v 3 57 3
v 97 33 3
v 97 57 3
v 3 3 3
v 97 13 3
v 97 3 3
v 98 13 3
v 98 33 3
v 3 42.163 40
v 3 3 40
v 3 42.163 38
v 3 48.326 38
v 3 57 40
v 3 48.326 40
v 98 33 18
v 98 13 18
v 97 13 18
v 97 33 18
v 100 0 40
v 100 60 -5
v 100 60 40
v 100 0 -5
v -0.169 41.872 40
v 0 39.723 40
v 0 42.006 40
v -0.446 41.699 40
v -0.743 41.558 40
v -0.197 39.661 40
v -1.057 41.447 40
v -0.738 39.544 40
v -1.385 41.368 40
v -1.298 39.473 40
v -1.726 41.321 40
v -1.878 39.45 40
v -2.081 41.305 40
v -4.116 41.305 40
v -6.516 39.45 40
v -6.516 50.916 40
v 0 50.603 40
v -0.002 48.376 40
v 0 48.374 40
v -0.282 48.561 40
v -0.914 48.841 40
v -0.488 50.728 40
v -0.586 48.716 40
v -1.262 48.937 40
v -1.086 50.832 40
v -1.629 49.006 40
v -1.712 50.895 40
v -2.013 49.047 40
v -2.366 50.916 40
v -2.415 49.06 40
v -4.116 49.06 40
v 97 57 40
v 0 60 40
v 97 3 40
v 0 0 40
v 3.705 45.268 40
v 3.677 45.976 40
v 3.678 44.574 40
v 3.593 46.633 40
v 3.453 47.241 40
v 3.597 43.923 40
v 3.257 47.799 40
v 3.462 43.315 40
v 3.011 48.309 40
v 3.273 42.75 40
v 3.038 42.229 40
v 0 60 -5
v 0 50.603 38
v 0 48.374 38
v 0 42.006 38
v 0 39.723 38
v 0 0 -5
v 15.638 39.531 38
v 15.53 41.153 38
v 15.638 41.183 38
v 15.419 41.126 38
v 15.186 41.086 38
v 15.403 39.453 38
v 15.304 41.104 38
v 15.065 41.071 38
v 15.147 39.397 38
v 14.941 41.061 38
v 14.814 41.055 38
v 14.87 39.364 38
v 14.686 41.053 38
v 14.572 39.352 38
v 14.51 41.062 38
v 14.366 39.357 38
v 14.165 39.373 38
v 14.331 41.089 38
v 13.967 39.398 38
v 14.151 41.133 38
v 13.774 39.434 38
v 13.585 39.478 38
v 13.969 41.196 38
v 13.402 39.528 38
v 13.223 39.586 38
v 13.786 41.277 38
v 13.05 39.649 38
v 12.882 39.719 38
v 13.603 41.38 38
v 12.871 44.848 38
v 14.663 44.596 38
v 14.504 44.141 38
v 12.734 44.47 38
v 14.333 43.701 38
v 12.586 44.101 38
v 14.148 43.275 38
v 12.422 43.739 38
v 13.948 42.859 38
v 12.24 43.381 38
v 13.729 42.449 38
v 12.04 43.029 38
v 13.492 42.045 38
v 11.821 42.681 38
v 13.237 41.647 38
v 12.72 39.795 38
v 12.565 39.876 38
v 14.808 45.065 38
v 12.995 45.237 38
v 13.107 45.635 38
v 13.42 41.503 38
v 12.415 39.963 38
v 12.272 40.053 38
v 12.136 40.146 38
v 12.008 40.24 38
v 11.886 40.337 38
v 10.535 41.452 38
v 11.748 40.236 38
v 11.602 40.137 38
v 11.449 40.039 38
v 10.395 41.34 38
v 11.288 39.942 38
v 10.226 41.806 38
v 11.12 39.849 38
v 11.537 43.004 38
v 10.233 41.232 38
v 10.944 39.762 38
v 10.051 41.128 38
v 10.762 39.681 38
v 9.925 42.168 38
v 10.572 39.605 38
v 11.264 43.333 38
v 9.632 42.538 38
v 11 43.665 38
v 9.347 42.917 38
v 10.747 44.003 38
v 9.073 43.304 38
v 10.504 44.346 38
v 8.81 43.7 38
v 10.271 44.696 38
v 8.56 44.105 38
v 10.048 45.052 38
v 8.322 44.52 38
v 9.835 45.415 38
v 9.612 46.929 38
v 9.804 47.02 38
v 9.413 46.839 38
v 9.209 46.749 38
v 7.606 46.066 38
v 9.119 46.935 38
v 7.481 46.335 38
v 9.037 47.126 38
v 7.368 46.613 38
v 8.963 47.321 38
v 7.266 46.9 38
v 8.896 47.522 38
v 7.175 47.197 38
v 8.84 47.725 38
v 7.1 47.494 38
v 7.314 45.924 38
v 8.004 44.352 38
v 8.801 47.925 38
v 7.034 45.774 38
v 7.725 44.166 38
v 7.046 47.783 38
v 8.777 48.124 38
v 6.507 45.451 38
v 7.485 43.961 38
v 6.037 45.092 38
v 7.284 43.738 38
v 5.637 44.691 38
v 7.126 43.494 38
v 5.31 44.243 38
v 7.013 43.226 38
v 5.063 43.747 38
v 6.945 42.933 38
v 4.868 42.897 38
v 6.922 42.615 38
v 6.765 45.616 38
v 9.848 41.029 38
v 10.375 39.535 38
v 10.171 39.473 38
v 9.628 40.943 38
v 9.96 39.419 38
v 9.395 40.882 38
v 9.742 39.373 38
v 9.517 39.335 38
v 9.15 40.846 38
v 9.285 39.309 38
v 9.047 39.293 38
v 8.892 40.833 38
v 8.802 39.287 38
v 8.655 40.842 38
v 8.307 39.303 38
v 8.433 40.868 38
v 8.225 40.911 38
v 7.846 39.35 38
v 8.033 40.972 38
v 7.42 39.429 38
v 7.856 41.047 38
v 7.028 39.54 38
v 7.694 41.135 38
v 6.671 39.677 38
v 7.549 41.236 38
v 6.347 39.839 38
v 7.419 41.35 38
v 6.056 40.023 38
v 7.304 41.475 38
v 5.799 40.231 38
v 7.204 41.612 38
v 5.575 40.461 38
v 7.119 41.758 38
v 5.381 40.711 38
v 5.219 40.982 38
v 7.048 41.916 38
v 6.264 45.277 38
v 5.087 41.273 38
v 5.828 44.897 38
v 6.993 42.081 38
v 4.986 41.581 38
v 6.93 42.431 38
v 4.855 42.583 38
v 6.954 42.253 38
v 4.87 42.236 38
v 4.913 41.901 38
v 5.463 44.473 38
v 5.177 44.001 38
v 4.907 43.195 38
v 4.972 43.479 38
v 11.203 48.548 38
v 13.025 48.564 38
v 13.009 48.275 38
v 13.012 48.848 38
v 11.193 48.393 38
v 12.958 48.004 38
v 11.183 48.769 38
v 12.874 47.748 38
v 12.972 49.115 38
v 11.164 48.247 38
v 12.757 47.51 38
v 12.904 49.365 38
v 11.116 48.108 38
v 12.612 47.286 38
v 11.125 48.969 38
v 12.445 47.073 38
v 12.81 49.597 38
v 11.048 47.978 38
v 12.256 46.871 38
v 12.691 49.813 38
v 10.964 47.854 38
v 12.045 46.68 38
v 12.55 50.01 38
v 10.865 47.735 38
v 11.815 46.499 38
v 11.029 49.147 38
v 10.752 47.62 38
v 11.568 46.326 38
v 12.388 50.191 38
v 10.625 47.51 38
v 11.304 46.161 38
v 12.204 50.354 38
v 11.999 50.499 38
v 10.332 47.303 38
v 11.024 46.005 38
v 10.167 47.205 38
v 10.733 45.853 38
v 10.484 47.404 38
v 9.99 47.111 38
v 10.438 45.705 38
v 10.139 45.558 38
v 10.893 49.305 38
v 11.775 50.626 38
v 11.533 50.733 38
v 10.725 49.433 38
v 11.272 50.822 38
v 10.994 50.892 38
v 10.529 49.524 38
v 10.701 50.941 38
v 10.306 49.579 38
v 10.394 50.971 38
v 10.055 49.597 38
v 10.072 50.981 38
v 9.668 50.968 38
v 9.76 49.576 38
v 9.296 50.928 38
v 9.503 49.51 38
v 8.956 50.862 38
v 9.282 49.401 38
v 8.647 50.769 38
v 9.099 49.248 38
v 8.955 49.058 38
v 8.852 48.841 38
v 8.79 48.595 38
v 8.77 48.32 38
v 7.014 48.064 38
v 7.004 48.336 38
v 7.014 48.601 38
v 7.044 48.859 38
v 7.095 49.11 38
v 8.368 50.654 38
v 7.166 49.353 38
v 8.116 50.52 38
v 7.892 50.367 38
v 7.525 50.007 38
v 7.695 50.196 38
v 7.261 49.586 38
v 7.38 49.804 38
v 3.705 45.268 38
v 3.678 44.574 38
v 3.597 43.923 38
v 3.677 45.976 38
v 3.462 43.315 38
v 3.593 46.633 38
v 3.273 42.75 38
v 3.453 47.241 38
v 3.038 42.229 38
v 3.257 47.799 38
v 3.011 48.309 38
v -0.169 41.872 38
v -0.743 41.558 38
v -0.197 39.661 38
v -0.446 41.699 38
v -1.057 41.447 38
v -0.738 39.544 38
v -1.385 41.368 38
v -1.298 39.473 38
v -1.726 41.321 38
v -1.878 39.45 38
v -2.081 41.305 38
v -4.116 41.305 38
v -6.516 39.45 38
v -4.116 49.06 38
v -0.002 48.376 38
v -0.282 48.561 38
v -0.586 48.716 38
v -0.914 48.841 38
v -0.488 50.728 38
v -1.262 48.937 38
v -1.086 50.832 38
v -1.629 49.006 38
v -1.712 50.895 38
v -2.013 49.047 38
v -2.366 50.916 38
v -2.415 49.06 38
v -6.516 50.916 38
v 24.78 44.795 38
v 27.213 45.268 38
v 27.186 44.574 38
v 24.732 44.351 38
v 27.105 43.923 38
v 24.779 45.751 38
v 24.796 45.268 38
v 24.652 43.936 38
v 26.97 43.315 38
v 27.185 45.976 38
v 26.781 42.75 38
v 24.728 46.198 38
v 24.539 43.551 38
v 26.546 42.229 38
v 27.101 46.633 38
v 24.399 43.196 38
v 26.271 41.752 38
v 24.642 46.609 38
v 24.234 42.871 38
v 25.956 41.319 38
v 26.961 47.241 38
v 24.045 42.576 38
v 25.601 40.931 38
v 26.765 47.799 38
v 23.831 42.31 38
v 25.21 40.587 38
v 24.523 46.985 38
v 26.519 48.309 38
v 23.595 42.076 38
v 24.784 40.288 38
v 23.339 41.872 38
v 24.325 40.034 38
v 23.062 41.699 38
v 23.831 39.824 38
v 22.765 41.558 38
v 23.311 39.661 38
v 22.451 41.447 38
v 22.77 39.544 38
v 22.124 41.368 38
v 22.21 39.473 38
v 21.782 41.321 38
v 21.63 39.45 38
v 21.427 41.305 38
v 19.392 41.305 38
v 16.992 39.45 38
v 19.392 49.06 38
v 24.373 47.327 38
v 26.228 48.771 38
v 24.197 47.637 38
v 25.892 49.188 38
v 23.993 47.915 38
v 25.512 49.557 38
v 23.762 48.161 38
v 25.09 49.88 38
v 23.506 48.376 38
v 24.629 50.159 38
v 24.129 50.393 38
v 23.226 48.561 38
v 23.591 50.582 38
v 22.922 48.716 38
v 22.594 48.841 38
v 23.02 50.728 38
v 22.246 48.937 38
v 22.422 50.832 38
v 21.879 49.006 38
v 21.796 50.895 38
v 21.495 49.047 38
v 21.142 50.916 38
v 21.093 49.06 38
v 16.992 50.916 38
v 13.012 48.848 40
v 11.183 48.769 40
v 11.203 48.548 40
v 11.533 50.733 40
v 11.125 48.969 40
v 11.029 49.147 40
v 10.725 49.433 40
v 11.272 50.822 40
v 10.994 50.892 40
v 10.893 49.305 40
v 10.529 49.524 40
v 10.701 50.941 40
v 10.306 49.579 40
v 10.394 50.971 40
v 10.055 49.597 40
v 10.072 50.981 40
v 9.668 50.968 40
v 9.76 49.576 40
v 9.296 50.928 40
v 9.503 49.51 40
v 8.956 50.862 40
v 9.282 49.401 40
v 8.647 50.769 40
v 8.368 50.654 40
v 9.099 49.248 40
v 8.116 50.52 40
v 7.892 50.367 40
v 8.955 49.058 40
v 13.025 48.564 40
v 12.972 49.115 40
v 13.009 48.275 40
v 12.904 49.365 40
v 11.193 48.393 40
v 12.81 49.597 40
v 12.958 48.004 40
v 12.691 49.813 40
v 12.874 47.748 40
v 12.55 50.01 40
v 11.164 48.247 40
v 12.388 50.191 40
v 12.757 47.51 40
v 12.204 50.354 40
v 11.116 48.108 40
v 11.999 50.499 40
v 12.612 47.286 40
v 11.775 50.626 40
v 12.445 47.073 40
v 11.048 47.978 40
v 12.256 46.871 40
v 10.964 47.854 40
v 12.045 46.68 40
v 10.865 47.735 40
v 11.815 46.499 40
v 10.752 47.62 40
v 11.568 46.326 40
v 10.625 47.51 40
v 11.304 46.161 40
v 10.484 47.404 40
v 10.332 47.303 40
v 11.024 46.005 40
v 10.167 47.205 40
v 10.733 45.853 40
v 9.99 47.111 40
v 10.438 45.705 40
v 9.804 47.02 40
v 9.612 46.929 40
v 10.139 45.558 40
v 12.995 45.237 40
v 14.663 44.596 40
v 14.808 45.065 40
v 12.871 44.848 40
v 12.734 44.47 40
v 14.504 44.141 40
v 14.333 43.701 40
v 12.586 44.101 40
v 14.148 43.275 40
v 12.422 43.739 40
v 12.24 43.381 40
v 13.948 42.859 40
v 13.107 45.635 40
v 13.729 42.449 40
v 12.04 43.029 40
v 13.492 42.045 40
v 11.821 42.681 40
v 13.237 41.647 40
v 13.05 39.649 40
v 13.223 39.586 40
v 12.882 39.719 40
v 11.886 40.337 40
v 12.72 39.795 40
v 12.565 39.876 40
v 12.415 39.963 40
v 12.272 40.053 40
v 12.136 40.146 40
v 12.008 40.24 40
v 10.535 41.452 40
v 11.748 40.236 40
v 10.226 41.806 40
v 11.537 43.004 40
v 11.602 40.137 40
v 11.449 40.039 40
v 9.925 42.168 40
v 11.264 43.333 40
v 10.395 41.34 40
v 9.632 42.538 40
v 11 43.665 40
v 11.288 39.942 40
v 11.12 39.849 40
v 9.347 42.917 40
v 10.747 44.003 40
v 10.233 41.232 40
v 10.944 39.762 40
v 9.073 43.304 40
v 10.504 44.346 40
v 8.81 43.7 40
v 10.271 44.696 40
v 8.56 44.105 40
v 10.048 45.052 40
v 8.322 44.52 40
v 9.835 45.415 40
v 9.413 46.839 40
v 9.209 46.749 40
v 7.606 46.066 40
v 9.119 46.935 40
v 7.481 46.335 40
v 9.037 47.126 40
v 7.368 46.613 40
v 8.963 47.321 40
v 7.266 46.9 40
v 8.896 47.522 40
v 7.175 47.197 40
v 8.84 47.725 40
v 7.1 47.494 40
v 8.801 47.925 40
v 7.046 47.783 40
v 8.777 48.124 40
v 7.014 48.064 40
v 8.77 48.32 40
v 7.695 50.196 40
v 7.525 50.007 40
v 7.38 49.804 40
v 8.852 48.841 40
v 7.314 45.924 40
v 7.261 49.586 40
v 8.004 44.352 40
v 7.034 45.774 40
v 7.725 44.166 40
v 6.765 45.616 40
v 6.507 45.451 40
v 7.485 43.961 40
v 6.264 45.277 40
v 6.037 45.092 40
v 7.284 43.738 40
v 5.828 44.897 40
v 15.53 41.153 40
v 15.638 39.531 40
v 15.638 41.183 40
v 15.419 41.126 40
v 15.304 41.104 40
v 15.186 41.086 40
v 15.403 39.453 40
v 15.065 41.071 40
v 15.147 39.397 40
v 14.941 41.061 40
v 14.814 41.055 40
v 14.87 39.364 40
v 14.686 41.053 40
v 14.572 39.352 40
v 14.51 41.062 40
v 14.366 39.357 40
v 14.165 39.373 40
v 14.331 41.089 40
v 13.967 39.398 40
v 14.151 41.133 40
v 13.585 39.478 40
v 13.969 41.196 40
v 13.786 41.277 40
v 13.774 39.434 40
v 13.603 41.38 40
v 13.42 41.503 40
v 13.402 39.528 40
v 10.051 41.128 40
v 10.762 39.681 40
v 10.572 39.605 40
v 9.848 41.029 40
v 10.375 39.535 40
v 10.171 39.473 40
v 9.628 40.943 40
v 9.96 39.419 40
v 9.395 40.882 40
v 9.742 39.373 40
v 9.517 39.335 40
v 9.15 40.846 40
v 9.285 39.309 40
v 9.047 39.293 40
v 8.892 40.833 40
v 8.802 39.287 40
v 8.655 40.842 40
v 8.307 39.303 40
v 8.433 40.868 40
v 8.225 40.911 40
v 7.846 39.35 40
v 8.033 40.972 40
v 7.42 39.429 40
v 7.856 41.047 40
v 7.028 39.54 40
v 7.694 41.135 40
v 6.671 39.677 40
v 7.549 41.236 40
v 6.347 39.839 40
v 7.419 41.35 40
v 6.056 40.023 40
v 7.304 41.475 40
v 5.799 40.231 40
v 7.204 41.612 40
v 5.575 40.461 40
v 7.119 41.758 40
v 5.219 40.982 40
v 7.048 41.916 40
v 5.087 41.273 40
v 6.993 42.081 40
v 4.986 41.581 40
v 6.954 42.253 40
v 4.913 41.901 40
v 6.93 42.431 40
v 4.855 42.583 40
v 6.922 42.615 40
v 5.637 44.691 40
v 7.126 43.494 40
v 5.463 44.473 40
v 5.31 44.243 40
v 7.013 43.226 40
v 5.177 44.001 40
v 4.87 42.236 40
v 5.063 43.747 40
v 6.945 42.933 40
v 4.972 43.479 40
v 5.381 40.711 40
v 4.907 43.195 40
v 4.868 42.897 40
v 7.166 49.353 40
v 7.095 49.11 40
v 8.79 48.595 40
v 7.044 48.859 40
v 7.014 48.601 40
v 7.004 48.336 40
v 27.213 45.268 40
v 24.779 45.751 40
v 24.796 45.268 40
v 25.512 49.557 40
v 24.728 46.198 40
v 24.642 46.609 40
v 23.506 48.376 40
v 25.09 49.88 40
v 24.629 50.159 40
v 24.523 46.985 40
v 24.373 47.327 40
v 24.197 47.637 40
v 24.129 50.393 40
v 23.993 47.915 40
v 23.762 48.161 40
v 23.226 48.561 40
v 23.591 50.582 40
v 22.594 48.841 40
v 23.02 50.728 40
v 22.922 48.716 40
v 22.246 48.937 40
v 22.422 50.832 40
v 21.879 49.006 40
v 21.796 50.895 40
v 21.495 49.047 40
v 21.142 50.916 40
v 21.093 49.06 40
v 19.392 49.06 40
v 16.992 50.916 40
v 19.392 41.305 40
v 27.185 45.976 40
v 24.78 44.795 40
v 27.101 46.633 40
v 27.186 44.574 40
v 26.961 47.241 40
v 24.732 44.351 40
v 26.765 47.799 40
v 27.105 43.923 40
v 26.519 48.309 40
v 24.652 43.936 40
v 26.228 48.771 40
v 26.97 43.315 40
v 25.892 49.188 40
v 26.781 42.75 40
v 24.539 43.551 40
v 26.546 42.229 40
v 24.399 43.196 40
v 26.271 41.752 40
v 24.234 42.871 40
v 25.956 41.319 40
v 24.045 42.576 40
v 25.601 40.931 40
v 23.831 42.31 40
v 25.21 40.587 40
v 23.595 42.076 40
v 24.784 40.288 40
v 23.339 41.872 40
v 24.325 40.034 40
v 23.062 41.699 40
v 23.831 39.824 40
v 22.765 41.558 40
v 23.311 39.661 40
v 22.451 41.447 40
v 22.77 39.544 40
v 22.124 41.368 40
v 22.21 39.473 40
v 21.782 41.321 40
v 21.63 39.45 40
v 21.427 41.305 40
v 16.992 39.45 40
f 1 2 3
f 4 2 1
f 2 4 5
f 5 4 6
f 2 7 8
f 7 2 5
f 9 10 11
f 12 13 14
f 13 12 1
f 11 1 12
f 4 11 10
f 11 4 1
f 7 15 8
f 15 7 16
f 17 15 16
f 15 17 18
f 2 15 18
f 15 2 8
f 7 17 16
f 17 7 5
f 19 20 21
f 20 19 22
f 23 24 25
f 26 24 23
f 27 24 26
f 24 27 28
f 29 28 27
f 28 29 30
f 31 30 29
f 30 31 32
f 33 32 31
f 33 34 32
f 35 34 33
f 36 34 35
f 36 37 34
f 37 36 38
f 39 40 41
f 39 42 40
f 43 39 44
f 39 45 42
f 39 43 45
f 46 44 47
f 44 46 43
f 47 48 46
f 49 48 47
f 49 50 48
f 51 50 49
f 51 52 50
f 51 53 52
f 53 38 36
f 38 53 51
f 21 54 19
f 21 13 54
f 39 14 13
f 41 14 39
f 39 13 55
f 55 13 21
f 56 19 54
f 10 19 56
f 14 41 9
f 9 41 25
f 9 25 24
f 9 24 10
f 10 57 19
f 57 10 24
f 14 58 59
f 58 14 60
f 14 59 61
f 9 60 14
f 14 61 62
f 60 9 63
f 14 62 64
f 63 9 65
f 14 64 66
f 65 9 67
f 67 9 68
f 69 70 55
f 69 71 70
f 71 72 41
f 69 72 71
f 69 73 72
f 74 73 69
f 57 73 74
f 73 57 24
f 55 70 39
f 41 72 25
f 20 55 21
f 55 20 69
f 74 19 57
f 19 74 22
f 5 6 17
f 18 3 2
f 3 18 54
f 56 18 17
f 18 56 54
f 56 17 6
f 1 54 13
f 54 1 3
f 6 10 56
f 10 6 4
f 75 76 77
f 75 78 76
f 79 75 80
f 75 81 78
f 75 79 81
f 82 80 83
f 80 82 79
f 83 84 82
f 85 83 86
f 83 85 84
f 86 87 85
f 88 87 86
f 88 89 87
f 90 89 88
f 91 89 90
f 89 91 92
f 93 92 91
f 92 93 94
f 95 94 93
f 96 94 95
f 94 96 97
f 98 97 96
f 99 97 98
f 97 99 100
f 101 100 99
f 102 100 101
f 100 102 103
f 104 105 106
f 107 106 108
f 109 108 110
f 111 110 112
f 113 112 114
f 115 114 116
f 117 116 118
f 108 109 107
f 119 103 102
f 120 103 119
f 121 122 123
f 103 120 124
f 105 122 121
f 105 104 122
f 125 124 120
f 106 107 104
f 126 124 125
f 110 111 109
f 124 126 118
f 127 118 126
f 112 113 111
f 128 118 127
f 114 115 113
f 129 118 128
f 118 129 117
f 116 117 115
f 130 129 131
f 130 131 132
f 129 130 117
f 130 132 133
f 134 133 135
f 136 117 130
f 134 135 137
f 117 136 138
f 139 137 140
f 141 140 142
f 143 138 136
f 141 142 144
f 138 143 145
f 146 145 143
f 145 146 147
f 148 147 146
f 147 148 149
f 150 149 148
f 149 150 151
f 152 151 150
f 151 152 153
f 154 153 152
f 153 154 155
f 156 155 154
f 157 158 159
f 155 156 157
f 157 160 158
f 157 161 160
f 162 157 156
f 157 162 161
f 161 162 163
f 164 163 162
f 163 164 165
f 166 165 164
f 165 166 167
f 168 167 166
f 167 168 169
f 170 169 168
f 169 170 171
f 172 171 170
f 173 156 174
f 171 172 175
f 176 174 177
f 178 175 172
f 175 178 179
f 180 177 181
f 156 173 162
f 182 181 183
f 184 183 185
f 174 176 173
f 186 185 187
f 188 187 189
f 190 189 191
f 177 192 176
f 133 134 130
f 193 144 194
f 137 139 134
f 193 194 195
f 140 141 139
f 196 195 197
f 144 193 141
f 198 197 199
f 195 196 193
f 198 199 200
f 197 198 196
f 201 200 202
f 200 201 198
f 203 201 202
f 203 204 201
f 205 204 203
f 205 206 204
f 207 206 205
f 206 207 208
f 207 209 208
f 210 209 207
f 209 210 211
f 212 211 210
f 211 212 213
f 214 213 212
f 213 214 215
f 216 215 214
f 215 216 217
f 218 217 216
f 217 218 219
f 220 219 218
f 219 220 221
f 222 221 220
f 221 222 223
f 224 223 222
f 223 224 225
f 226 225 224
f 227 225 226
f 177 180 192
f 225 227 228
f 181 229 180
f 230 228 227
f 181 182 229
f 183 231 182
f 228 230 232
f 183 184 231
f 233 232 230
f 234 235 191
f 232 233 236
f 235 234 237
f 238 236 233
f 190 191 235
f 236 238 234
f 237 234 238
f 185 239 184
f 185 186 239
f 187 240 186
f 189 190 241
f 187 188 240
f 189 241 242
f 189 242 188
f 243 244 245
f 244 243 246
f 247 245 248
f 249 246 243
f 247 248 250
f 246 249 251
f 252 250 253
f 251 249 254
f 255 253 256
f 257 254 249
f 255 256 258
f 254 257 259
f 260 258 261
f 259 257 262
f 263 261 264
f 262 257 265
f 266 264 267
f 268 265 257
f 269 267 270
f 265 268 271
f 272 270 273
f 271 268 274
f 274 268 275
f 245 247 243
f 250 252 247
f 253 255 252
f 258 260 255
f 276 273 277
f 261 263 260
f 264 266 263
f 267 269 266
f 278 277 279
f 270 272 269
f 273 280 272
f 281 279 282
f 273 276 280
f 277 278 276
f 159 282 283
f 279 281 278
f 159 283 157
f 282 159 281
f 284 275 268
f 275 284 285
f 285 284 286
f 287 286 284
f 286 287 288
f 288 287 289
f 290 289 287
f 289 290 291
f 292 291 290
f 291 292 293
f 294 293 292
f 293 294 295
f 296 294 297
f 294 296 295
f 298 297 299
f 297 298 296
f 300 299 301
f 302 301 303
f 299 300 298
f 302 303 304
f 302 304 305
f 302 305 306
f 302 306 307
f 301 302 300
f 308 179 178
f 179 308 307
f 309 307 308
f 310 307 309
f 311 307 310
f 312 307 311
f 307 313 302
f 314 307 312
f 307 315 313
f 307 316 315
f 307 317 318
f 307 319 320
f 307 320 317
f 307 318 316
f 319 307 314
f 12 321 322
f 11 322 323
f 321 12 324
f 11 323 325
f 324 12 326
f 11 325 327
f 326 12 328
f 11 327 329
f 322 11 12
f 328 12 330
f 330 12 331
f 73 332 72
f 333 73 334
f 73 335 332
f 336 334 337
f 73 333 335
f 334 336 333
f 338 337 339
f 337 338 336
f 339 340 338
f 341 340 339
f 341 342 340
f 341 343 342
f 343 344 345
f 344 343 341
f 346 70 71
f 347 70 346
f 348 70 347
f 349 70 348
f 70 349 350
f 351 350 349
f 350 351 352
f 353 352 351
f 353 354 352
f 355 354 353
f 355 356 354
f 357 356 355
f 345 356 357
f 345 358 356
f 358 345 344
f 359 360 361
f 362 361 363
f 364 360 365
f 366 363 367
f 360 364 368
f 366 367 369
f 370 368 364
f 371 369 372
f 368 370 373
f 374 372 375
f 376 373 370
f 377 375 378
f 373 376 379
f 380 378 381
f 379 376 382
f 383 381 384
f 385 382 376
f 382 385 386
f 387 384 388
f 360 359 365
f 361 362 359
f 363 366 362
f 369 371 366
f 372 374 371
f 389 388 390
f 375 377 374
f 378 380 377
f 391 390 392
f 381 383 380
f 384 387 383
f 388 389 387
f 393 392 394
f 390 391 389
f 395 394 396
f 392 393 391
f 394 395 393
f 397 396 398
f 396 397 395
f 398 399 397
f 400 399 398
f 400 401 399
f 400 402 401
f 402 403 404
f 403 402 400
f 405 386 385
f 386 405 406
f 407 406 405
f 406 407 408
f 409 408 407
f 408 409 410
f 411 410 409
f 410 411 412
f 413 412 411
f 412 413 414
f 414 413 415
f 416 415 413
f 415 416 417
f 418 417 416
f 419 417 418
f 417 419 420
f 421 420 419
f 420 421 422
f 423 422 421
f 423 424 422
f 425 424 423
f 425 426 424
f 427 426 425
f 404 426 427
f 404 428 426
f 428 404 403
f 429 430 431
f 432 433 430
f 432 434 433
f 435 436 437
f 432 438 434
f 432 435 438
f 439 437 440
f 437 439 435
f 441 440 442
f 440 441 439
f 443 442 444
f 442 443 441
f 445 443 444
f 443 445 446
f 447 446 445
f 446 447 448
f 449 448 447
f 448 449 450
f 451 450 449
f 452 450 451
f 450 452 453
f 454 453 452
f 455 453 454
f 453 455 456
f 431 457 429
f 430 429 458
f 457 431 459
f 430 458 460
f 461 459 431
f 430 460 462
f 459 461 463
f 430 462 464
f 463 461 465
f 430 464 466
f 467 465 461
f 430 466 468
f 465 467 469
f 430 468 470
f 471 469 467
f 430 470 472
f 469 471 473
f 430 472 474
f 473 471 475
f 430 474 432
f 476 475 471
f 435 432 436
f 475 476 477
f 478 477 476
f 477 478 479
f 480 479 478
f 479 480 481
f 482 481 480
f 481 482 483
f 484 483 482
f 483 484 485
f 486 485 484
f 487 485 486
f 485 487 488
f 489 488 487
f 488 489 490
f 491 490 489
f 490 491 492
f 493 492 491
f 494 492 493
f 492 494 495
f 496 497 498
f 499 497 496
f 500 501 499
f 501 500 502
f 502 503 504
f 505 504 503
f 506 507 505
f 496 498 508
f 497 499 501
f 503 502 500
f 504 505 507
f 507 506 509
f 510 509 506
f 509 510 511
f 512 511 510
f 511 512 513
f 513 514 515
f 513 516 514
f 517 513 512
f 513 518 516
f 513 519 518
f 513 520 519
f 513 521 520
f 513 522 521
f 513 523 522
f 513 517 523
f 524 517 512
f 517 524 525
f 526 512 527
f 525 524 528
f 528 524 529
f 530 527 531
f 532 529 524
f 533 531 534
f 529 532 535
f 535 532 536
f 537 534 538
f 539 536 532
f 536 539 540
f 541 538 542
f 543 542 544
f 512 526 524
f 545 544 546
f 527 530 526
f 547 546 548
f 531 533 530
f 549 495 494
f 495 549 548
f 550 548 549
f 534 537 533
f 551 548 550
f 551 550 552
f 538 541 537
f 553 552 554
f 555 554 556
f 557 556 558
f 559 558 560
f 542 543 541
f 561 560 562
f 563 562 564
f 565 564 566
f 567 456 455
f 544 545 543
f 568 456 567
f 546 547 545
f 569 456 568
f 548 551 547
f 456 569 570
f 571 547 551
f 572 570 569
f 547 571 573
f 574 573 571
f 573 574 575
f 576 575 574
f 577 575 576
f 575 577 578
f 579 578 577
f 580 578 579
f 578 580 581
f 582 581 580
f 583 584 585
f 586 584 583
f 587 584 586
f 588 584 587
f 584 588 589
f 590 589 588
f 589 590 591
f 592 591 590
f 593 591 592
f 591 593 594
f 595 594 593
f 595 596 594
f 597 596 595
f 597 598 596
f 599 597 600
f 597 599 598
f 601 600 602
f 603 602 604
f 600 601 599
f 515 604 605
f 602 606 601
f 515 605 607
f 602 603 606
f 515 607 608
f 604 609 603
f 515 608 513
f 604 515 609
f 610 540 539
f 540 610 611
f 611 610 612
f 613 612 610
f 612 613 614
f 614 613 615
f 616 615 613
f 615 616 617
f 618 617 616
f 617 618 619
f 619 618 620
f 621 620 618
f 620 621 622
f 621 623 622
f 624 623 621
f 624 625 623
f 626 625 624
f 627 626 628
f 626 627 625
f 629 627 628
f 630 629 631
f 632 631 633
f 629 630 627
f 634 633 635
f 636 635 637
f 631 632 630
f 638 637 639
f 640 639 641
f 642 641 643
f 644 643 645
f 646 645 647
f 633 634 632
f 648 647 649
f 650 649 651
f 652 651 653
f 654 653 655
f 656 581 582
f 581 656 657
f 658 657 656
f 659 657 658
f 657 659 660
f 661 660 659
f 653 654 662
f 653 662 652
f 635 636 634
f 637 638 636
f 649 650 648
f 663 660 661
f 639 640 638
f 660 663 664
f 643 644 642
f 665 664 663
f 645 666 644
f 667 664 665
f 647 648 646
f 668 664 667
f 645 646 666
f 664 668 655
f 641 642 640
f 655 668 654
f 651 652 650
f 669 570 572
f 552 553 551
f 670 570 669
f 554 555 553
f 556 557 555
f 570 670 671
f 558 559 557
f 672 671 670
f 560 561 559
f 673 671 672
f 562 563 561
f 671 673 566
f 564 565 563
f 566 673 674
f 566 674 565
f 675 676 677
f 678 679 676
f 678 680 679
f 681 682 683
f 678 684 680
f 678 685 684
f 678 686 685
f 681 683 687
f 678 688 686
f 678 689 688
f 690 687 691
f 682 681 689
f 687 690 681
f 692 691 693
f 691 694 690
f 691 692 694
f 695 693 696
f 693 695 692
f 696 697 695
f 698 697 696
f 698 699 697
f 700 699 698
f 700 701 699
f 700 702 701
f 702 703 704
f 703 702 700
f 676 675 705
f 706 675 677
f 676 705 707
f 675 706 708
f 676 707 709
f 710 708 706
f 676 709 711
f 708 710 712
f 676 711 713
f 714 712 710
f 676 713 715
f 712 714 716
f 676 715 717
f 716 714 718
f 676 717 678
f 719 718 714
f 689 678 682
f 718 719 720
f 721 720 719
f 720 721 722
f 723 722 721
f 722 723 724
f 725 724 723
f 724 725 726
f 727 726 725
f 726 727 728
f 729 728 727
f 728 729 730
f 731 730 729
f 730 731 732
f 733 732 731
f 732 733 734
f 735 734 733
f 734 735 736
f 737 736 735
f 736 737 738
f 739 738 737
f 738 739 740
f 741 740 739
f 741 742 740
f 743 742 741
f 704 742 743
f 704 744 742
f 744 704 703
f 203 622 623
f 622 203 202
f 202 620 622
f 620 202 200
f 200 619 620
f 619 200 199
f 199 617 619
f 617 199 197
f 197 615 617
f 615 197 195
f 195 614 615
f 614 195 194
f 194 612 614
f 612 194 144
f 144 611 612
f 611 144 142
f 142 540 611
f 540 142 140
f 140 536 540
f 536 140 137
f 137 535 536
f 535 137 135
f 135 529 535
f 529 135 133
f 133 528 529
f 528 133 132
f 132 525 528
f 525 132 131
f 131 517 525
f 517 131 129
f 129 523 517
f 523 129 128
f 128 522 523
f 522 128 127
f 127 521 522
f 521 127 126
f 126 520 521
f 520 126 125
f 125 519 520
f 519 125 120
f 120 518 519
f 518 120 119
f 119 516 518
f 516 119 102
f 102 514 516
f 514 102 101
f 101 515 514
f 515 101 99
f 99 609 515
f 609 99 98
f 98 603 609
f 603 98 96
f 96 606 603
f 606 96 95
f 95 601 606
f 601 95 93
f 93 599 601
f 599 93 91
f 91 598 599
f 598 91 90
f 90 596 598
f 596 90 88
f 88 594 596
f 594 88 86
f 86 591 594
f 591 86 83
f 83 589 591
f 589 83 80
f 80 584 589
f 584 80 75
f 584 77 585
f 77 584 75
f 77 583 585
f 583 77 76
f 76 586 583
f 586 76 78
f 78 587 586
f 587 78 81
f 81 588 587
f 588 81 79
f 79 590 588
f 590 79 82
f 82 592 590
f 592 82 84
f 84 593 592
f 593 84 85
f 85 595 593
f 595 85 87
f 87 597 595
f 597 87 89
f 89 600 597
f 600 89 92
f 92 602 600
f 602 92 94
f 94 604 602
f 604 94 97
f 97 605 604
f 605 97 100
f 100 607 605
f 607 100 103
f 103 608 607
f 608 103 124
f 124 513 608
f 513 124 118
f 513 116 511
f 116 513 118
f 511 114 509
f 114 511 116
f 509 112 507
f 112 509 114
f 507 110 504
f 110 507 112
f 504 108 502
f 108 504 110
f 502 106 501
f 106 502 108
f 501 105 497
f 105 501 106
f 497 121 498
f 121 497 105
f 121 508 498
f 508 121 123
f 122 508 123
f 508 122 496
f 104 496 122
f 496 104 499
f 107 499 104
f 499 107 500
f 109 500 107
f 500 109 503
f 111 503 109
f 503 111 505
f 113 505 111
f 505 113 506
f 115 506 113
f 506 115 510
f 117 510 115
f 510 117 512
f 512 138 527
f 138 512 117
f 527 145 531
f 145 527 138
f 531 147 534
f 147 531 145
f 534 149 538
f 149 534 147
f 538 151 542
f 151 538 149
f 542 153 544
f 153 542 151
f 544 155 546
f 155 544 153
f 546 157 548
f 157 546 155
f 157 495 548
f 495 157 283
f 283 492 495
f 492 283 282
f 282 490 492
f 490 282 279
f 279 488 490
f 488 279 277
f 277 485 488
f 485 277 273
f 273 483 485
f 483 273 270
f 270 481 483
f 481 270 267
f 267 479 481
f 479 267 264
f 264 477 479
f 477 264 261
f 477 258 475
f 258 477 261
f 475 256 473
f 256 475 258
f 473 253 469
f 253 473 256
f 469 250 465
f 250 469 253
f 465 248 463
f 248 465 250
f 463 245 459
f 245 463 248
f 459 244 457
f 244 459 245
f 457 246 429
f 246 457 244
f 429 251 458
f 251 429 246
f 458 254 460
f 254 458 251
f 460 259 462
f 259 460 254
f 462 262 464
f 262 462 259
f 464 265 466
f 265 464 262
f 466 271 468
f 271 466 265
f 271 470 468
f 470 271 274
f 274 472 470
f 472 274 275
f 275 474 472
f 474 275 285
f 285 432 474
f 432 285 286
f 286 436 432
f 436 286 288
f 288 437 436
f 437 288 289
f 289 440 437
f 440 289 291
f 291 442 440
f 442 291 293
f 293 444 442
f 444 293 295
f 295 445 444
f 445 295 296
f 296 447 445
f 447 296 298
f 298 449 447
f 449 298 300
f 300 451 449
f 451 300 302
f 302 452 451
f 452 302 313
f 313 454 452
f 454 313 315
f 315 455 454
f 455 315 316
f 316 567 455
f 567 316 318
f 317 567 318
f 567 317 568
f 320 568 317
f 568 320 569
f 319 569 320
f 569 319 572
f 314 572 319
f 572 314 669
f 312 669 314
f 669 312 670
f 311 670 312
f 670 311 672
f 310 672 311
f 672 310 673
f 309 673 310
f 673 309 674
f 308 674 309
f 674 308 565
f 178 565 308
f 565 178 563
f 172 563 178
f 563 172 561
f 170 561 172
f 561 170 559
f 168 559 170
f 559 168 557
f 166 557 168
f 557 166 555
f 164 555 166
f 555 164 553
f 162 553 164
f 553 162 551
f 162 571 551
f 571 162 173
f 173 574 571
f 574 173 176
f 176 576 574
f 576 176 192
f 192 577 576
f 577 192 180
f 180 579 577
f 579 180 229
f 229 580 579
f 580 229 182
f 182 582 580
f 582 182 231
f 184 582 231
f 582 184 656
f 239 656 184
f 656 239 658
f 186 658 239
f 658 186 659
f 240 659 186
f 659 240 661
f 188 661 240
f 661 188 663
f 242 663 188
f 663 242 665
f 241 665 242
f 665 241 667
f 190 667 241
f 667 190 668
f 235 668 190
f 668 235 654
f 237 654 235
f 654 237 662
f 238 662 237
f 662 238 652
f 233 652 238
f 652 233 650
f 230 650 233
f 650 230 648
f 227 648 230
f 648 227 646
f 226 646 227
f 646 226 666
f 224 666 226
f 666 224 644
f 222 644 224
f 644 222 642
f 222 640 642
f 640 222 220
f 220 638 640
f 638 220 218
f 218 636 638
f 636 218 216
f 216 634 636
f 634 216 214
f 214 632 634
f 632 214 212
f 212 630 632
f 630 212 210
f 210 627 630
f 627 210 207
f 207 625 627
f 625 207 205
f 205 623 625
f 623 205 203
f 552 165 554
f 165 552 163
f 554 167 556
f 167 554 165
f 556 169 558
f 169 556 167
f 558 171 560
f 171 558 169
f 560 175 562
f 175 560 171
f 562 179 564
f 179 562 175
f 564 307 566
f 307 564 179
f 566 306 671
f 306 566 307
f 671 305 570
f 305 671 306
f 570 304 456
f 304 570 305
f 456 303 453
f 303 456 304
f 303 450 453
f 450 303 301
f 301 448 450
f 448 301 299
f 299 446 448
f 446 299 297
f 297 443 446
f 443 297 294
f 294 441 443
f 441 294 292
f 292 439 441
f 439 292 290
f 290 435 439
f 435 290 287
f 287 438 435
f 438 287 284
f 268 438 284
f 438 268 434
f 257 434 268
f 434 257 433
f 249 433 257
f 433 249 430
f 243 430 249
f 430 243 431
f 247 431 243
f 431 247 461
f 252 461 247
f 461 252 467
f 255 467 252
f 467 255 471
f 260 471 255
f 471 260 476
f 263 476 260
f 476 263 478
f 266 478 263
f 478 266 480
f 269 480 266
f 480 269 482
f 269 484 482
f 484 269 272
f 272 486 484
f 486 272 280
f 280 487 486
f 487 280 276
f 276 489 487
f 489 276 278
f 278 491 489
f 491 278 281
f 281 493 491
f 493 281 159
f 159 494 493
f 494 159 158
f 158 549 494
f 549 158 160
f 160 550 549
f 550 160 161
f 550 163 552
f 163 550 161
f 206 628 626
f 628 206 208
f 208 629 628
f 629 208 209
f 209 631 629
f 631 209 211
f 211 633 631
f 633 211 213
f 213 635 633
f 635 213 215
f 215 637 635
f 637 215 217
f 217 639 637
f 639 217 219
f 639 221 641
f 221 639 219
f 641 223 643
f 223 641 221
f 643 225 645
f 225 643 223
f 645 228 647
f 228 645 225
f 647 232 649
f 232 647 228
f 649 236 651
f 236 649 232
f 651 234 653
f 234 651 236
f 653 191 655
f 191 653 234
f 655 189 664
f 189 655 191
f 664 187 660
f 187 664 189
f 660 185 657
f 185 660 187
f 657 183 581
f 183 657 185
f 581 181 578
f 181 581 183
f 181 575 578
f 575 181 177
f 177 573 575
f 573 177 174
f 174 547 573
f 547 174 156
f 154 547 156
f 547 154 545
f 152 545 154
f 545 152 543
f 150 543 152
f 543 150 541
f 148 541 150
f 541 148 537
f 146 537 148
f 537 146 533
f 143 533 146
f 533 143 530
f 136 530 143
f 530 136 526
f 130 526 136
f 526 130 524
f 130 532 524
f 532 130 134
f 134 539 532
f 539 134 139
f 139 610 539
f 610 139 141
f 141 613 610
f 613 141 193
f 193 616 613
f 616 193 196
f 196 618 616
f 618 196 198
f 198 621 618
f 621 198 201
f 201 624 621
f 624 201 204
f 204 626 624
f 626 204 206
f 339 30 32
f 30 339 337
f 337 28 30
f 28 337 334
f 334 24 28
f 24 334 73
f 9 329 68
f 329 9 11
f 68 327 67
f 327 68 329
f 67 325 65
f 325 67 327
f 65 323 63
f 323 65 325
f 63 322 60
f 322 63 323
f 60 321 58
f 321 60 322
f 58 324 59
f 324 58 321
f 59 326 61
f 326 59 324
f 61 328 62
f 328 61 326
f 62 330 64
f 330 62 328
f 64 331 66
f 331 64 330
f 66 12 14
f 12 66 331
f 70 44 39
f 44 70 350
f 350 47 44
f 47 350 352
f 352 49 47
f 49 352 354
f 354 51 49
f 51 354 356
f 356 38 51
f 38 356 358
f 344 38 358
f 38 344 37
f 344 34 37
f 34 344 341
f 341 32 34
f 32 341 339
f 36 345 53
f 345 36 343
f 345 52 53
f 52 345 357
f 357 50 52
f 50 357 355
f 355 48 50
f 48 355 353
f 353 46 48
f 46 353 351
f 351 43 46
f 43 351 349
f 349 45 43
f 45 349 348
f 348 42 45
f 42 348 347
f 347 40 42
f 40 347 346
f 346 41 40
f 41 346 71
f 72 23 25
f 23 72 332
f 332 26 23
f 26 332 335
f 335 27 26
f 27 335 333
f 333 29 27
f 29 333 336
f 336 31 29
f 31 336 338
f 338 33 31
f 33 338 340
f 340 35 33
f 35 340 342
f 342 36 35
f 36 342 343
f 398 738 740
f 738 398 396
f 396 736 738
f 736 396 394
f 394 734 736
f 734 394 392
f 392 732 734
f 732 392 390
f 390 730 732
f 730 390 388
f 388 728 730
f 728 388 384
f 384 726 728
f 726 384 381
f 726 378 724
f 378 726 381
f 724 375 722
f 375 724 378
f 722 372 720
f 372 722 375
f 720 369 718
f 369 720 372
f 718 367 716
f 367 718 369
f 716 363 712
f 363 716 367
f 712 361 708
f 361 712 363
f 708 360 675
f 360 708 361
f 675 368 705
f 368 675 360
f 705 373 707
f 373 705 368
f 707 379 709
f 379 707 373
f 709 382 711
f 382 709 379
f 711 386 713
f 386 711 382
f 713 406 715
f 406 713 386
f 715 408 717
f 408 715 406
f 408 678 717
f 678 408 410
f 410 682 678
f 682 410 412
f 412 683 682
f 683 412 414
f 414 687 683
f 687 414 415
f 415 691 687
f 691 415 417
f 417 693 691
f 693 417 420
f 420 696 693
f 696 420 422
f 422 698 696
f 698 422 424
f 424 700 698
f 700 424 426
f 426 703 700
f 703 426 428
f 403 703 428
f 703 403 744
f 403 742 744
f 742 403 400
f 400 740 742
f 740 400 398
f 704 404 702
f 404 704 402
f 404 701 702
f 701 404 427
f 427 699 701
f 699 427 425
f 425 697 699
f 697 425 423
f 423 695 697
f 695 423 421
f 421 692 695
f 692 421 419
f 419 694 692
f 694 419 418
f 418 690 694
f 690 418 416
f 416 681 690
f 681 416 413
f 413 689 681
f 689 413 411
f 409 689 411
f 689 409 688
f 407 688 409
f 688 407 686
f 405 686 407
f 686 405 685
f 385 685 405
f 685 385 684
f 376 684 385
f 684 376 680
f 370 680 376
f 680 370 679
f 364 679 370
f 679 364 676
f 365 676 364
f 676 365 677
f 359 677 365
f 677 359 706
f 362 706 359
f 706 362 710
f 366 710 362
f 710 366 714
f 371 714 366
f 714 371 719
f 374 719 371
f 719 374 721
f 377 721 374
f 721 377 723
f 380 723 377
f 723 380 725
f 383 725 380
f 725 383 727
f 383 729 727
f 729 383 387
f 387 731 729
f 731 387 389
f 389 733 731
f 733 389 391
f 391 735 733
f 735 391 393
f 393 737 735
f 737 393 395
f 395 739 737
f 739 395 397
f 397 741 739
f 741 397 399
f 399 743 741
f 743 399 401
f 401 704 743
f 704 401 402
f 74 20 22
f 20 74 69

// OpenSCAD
// D&D Dice Holder
// A themed dice holder for Dungeons & Dragons with decorative elements

// Dimensions
holder_width = 100;
holder_depth = 60;
holder_height = 40;

// Dice compartment dimensions
compartment_width = 20;
compartment_depth = 20;
compartment_height = 15;

// Wall thickness
wall_thickness = 3;

// Number of compartments
num_compartments = 4;

// Main dice holder body
module dice_holder() {
    difference() {
        // Outer dimensions
        cube([holder_width, holder_depth, holder_height]);
        
        // Inner hollow space
        translate([wall_thickness, wall_thickness, wall_thickness]) {
            cube([
                holder_width - 2*wall_thickness,
                holder_depth - 2*wall_thickness,
                holder_height - wall_thickness
            ]);
        }
        
        // Dice compartments
        for (i = [0:num_compartments-1]) {
            translate([
                wall_thickness + i*(compartment_width + 5),
                wall_thickness + 10,
                wall_thickness
            ]) {
                cube([compartment_width, compartment_depth, compartment_height]);
            }
        }
    }
}

// D&D themed nameplate
module nameplate() {
    translate([holder_width/2 - 40, holder_depth - 15, holder_height - 2]) {
        linear_extrude(height = 2) {
            text("D&D", font = "Arial:style=Bold", size = 12, halign = "center", valign = "center");
        }
    }
}

// Decorative elements - dragon scales pattern
module dragon_scales() {
    for (i = [0:3]) {
        for (j = [0:4]) {
            translate([10 + i*20, 10 + j*15, holder_height - 1]) {
                circle(r = 2);
            }
        }
    }
}

// Main assembly
union() {
    dice_holder();
    nameplate();
    dragon_scales();
}

// Optional: Add a base for stability
translate([0, 0, -5]) {
    cube([holder_width, holder_depth, 5]);
}
